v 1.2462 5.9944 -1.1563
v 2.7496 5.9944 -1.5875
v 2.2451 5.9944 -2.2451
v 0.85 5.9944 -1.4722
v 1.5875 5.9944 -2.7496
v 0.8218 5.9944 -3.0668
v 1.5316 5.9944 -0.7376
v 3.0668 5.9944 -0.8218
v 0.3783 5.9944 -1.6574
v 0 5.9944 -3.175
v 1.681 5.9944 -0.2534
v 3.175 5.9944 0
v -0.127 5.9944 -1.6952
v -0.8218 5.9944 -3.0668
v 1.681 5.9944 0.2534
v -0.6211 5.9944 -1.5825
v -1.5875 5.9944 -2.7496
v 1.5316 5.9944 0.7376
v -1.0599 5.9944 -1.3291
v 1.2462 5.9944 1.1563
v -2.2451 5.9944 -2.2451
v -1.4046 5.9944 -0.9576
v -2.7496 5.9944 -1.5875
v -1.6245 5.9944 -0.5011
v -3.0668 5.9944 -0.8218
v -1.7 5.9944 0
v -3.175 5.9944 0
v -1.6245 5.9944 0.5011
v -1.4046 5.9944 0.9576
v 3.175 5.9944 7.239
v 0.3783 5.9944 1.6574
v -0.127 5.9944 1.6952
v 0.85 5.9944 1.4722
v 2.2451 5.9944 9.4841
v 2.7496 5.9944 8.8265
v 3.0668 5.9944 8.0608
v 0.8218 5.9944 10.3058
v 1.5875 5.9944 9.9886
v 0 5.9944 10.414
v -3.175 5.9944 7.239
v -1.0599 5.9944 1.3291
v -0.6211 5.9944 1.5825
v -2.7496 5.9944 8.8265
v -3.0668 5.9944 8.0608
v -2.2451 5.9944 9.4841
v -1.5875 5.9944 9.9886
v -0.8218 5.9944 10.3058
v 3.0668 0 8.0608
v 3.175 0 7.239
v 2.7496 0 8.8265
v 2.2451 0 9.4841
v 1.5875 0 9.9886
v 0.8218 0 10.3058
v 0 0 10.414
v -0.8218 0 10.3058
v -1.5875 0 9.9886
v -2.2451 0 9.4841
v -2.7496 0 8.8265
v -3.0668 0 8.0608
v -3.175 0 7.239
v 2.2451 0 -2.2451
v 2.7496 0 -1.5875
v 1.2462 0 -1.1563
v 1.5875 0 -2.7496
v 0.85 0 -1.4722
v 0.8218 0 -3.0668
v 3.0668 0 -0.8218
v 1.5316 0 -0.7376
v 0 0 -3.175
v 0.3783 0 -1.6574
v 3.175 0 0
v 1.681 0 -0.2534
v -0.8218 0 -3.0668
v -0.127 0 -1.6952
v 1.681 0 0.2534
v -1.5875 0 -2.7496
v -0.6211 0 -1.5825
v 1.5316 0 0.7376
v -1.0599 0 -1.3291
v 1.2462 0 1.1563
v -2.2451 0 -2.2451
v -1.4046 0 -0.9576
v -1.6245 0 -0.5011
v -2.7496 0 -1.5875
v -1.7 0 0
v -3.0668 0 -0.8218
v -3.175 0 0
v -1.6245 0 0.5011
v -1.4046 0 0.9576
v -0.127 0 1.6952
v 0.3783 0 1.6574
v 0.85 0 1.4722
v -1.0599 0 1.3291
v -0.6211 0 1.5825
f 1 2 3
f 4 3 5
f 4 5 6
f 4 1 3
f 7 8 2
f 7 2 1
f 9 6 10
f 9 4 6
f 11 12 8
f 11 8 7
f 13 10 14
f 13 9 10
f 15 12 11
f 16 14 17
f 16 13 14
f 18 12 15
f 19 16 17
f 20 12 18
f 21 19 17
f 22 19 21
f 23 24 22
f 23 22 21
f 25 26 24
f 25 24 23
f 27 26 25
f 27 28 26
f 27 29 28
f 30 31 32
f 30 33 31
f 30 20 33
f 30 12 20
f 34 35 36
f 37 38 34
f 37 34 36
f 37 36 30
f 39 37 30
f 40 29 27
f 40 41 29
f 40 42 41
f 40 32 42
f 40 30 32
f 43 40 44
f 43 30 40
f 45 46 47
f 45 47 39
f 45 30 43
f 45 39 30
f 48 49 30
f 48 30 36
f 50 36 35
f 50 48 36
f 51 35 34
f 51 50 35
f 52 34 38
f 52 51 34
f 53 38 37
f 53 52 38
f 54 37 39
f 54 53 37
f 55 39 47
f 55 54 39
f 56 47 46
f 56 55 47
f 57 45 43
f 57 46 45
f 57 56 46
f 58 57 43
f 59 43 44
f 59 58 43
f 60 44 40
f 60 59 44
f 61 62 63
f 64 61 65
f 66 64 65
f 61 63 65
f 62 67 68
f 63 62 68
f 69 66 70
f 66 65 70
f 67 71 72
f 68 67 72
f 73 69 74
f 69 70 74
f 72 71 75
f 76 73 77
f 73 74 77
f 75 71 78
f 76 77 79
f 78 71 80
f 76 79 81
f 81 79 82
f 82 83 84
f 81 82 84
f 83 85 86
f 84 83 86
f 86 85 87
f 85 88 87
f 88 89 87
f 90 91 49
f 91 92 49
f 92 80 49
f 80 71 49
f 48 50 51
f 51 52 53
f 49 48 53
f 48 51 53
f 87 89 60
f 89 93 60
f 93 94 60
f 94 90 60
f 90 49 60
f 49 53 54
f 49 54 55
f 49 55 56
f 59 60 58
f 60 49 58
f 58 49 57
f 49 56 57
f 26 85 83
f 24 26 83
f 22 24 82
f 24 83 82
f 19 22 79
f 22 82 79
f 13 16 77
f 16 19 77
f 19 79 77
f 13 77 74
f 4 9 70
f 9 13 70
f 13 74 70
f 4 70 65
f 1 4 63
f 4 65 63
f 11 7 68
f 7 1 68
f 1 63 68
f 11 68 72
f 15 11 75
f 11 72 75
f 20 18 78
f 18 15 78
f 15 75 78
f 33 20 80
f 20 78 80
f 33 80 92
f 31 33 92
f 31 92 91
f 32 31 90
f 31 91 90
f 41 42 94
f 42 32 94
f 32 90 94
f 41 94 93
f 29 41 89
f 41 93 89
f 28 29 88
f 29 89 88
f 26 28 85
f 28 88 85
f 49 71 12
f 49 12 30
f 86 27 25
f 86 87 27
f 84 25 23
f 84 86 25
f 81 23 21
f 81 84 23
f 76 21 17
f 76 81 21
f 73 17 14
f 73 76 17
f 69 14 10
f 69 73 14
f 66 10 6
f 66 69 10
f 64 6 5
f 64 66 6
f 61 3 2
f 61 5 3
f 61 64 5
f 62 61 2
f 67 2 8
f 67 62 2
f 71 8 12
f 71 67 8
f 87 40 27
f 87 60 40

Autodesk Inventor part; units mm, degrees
ref_plane "YZ Plane" through (0, 0, 0) normal (1, 0, 0) x (0, 1, 0)
ref_plane "XZ Plane" through (0, 0, 0) normal (0, 1, 0) x (-1, 0, 0)
ref_plane "XY Plane" through (0, 0, 0) normal (0, 0, 1) x (1, 0, 0)
sketch "Sketch1" plane through (0, 0, 0) normal (0, 1, 0) x (-1, 0, 0)
  circle A0 centre (0, 0) radius 1.7
  arc A1 (-3.175, 0) -> (3.175, 0) centre (0, 0) ccw
  line L0 (-3.175, 0) -> (-3.175, 7.239)
  line L1 (3.175, 7.239) -> (3.175, 0)
  arc A2 (3.175, 7.239) -> (-3.175, 7.239) centre (0, 7.239) ccw
  dimension "d0" = 3.4
  dimension "d1" = 6.35
  dimension "d6" = 6.35
  dimension "d8" = 7.239
extrude "Extrusion1" add sketch "Sketch1" along normal blind 5.9944
properties part number "Limit switch trigger spacer"
